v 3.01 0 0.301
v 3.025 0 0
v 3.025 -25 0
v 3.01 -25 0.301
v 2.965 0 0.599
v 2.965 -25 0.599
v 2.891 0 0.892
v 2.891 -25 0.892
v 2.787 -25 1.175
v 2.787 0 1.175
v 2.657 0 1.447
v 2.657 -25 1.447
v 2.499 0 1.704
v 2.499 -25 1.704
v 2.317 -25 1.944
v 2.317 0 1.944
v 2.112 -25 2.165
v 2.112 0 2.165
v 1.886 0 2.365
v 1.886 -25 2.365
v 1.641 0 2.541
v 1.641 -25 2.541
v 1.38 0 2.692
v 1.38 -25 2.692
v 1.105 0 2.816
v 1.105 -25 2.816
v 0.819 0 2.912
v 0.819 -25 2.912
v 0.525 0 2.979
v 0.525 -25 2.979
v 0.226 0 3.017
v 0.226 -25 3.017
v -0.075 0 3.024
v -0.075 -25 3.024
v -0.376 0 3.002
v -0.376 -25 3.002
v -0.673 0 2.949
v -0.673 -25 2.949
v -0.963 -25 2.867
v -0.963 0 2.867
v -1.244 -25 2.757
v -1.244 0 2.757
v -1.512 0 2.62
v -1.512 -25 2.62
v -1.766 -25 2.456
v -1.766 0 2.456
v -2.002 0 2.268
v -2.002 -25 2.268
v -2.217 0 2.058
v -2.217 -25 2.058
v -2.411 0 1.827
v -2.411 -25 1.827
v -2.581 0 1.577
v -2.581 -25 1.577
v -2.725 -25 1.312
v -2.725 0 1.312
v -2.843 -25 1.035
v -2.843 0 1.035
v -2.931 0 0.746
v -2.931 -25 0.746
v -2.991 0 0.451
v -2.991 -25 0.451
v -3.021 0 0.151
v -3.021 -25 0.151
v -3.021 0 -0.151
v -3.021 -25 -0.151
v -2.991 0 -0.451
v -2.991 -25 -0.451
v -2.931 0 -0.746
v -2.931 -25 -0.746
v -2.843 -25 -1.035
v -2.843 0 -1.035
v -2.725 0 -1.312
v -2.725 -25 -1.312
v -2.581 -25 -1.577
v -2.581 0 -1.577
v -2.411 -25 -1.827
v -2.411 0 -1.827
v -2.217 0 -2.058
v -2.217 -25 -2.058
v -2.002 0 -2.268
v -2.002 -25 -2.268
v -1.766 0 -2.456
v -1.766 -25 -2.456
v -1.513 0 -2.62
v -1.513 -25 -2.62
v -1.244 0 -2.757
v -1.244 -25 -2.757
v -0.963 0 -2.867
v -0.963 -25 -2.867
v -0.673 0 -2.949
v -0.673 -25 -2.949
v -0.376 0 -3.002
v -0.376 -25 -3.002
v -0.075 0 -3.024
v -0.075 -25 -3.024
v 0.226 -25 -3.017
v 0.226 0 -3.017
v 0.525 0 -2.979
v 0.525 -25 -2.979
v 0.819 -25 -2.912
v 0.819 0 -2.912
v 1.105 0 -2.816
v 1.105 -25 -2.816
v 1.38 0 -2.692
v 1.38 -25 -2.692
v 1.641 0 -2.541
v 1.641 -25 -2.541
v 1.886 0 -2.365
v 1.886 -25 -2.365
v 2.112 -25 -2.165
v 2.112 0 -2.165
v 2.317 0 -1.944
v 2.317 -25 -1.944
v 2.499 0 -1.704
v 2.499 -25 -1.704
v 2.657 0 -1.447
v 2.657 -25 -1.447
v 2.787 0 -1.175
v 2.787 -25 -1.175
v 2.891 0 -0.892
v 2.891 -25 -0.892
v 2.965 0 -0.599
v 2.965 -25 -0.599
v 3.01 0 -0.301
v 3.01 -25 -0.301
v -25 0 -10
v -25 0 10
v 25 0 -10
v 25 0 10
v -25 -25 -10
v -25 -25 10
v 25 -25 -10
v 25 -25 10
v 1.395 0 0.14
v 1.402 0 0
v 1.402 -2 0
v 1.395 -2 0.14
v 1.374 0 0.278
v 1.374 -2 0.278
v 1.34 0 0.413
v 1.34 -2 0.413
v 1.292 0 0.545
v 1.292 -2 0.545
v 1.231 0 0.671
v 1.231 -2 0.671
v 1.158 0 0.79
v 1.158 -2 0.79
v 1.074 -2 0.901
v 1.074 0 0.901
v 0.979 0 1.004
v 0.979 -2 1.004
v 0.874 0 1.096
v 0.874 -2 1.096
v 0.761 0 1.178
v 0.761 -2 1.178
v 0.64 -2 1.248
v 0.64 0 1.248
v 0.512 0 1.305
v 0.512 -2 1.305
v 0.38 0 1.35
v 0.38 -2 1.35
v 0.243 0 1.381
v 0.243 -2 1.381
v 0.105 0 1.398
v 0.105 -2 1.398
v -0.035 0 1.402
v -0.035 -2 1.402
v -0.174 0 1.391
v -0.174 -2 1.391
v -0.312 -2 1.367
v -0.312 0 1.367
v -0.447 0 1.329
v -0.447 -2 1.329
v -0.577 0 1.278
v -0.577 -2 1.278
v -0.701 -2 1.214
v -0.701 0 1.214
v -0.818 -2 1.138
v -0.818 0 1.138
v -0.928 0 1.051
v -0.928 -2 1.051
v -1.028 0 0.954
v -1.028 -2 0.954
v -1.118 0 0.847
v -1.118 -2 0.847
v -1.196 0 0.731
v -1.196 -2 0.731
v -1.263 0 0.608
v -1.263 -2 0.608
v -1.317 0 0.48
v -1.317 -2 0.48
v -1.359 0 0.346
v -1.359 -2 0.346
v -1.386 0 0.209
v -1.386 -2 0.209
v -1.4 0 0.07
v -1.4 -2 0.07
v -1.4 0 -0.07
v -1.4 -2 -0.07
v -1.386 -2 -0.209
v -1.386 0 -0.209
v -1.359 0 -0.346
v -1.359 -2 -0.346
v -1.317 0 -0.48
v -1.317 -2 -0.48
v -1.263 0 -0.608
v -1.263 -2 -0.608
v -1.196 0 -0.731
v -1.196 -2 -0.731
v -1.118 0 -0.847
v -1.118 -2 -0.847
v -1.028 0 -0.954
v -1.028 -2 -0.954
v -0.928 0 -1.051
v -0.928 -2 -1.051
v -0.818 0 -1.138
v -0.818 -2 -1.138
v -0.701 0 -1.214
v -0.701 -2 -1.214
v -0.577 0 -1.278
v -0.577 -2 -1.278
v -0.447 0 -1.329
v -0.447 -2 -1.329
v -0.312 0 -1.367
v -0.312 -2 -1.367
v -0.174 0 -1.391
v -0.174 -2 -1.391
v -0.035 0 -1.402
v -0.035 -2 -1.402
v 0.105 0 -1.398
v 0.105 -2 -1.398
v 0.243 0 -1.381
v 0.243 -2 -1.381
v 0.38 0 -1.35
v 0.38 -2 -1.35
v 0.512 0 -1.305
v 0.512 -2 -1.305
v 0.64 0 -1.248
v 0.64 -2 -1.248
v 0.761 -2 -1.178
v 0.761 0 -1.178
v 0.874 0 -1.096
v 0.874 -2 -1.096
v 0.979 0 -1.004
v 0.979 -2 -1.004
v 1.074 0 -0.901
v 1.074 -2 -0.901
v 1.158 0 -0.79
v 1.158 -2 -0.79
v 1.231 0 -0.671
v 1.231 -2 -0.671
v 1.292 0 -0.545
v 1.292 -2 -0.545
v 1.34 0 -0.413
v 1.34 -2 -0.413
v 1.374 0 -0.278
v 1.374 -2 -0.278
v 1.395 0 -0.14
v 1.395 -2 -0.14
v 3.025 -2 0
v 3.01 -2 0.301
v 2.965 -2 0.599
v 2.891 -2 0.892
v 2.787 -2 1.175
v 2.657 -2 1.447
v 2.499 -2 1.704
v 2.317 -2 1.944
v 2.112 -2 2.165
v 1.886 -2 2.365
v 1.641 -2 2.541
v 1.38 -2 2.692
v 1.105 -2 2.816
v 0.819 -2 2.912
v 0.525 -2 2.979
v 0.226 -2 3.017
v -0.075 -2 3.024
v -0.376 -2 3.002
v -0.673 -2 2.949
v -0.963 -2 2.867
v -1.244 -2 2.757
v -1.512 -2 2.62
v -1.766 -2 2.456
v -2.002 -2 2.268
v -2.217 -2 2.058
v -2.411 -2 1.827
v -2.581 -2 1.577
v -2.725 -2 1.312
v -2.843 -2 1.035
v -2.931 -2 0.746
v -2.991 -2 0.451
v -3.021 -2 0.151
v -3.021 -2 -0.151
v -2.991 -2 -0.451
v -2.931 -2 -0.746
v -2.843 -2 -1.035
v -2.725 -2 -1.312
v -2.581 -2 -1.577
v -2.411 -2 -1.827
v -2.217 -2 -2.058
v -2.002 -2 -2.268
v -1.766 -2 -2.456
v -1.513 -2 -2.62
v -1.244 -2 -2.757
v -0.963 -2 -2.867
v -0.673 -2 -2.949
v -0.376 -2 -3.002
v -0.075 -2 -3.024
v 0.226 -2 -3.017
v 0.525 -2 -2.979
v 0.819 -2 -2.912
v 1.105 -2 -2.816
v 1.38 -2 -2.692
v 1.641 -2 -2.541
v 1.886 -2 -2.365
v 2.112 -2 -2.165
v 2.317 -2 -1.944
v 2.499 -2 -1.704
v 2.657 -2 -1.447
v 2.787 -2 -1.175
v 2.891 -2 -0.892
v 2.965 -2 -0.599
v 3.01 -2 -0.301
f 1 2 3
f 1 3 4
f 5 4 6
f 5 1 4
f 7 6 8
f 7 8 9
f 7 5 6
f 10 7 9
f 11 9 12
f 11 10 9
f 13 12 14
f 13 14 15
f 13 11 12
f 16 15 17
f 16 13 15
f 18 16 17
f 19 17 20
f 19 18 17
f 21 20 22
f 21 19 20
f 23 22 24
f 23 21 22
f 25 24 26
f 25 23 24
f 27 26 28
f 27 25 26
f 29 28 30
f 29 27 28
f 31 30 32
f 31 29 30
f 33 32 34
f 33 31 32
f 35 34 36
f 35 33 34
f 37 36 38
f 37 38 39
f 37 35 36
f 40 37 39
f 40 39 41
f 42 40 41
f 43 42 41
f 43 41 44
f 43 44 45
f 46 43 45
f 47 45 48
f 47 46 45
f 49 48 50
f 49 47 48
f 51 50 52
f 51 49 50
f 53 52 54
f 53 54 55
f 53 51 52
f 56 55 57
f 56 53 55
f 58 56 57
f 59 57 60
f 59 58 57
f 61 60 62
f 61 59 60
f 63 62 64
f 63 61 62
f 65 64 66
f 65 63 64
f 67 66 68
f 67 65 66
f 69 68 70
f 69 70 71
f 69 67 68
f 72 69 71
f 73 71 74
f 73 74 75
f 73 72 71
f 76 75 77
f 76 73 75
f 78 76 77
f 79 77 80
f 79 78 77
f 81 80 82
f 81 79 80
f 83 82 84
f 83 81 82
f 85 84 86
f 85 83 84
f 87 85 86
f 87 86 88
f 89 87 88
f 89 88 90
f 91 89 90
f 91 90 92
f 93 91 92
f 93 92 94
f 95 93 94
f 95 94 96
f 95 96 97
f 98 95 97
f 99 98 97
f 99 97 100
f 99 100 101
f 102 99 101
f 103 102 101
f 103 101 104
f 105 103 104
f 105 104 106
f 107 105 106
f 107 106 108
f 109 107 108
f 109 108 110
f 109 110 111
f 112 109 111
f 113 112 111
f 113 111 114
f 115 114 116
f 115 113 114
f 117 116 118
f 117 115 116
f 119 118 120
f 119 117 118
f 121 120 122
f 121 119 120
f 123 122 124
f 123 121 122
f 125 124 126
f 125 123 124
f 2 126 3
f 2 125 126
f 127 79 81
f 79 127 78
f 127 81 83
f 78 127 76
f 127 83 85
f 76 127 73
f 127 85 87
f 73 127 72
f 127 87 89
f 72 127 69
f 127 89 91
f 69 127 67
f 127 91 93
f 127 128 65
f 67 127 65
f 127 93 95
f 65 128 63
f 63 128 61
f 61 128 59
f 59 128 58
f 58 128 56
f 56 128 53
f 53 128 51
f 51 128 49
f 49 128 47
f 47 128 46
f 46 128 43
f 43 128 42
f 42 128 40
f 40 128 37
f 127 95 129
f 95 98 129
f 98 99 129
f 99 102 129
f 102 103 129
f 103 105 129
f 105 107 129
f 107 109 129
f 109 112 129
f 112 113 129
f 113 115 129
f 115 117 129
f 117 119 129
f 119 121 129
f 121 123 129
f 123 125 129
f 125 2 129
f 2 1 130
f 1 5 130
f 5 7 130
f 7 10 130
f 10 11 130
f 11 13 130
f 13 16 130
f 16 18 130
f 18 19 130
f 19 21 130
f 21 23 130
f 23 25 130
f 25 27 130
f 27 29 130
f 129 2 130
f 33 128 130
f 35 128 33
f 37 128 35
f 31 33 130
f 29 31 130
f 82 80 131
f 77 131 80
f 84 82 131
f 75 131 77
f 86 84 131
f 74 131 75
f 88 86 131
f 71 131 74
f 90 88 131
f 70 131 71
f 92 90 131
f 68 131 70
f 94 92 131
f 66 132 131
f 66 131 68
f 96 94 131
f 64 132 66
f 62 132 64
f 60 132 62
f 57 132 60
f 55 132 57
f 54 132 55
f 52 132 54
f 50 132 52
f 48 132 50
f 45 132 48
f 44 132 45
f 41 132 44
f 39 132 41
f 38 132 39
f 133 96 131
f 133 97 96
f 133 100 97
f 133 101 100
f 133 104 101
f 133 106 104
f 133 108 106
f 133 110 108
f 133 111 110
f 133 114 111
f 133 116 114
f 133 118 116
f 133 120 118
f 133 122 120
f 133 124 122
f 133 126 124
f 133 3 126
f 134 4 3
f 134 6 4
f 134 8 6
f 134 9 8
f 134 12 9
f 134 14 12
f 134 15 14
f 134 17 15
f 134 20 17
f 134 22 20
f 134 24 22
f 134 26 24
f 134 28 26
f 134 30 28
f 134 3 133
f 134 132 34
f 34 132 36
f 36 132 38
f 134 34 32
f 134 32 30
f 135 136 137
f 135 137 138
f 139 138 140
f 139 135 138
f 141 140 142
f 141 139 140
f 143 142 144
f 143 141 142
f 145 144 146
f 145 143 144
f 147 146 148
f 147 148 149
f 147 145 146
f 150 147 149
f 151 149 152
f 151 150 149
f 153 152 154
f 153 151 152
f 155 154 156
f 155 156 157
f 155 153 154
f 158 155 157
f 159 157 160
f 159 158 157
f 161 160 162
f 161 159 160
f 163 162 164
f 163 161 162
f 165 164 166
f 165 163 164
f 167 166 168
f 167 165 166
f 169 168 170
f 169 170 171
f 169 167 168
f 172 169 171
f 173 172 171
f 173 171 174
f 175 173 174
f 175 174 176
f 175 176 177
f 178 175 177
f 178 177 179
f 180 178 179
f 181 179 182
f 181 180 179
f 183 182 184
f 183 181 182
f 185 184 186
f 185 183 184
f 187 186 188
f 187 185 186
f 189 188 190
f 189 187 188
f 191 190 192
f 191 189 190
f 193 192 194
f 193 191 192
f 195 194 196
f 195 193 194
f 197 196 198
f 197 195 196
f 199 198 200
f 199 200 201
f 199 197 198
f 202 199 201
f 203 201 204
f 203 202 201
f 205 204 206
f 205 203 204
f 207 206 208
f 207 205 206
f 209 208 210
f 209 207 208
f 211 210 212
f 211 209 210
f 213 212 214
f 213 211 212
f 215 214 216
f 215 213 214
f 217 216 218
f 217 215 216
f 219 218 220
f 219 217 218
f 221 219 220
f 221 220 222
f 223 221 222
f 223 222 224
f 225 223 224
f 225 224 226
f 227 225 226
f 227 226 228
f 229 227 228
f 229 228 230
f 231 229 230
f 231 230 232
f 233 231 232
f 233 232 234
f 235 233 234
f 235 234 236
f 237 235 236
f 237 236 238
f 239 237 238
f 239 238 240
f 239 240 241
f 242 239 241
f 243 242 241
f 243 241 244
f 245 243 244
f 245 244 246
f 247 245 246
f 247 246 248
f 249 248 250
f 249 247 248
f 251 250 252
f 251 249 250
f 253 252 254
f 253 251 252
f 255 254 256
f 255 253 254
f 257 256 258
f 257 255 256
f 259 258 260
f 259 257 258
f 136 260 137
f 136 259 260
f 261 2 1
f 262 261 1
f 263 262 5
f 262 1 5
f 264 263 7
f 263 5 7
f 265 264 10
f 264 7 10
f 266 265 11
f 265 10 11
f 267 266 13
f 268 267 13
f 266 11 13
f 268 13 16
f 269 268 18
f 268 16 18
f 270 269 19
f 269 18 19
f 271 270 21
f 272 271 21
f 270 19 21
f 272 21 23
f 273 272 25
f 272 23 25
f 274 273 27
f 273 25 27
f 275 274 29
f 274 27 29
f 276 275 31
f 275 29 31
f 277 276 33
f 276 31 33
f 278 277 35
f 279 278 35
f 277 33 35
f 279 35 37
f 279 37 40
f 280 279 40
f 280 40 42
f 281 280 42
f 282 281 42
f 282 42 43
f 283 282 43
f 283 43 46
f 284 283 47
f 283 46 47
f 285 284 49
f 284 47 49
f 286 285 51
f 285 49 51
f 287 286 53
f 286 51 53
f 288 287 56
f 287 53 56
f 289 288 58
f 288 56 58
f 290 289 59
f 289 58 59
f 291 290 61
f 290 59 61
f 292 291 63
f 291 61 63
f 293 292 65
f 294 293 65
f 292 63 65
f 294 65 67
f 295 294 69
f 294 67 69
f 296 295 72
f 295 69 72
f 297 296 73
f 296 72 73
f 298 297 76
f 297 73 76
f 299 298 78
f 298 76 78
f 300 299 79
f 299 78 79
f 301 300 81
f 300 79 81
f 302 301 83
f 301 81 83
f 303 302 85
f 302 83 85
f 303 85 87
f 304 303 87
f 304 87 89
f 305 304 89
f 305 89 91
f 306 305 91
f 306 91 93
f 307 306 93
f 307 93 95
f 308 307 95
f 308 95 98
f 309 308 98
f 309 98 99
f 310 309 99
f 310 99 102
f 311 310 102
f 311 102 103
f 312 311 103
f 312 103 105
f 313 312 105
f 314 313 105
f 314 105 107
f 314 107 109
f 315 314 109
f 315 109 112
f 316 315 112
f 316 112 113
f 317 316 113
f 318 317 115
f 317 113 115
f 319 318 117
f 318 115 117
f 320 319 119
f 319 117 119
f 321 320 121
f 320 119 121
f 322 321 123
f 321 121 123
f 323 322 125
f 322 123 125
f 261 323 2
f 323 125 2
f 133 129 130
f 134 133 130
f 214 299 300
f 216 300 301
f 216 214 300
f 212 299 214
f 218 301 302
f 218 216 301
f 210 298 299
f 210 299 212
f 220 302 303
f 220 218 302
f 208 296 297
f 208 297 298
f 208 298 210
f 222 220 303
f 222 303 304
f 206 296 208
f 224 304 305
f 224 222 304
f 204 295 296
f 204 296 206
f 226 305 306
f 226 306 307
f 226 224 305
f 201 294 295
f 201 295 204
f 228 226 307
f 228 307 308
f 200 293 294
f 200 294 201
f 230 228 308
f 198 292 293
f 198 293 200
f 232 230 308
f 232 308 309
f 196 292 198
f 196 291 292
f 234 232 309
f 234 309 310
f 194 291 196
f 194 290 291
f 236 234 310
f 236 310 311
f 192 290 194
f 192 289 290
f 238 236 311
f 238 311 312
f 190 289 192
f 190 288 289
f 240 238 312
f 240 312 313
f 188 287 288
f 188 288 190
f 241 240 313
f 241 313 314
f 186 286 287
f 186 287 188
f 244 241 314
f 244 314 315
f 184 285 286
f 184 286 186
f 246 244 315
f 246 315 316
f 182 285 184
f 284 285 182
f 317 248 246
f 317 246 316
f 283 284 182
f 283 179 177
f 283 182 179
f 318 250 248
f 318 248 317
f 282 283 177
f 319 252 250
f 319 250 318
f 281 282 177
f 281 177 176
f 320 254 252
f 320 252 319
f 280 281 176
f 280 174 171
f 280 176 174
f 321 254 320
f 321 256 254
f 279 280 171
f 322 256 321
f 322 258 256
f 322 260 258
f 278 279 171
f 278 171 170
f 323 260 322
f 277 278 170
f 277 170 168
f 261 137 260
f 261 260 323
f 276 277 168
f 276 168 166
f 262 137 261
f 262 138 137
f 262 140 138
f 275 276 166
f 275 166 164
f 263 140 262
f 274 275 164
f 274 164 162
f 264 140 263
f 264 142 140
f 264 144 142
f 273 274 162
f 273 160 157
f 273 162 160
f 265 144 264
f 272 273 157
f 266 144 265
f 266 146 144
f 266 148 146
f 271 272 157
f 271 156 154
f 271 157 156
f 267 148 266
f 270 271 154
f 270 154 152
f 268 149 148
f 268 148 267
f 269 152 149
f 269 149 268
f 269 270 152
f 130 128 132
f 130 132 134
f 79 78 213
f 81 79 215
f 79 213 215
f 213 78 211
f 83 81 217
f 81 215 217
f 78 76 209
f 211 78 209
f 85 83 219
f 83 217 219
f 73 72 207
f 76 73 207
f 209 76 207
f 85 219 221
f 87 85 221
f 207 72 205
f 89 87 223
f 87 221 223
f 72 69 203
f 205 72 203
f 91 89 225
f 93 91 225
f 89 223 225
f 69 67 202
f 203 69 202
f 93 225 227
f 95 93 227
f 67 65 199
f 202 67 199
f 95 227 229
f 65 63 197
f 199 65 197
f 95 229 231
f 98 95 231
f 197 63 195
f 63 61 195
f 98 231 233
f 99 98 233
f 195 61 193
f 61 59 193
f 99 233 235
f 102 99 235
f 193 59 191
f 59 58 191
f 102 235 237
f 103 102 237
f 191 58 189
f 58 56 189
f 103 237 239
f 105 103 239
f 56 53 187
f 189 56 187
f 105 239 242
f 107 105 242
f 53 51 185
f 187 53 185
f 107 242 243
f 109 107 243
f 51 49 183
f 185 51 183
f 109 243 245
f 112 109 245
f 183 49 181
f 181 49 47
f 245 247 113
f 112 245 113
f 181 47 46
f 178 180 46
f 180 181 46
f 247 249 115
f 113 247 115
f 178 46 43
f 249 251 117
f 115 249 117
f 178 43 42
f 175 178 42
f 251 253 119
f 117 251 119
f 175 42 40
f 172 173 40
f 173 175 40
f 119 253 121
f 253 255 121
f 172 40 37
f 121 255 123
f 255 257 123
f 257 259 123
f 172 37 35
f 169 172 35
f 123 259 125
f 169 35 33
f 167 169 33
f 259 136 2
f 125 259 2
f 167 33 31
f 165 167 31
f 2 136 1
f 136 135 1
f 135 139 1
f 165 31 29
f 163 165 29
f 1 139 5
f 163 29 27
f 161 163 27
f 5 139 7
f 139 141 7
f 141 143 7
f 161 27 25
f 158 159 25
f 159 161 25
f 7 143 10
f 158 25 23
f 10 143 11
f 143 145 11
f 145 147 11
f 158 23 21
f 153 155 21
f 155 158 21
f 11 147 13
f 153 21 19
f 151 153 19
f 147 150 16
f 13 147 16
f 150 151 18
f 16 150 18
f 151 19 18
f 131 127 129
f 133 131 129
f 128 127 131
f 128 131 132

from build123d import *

# Parameters (mm, degrees)
F0_W     = 50
F0_H     = 20
F0_R     = 3.025
F1_DEPTH = 25
F0_R_2   = 1.402
F3_DEPTH = 2


# Not quite as in the source:
# - the program builds the solid bodies; features that only make, move or delete a surface that nothing else refers to are left out


with BuildPart() as f1:
    # F0 (on Front) → F1 (new body)
    with BuildSketch(Plane.XZ):
        Rectangle(F0_W, F0_H)
        Circle(F0_R, mode=Mode.SUBTRACT)
    extrude(amount=F1_DEPTH)


with BuildPart() as f3:
    # F0 (on Front) → F3 (new body)
    with BuildSketch(Plane.XZ):
        Circle(F0_R)
        Circle(F0_R_2, mode=Mode.SUBTRACT)
    extrude(amount=F3_DEPTH)


solid = Compound([f1.part, f3.part])
